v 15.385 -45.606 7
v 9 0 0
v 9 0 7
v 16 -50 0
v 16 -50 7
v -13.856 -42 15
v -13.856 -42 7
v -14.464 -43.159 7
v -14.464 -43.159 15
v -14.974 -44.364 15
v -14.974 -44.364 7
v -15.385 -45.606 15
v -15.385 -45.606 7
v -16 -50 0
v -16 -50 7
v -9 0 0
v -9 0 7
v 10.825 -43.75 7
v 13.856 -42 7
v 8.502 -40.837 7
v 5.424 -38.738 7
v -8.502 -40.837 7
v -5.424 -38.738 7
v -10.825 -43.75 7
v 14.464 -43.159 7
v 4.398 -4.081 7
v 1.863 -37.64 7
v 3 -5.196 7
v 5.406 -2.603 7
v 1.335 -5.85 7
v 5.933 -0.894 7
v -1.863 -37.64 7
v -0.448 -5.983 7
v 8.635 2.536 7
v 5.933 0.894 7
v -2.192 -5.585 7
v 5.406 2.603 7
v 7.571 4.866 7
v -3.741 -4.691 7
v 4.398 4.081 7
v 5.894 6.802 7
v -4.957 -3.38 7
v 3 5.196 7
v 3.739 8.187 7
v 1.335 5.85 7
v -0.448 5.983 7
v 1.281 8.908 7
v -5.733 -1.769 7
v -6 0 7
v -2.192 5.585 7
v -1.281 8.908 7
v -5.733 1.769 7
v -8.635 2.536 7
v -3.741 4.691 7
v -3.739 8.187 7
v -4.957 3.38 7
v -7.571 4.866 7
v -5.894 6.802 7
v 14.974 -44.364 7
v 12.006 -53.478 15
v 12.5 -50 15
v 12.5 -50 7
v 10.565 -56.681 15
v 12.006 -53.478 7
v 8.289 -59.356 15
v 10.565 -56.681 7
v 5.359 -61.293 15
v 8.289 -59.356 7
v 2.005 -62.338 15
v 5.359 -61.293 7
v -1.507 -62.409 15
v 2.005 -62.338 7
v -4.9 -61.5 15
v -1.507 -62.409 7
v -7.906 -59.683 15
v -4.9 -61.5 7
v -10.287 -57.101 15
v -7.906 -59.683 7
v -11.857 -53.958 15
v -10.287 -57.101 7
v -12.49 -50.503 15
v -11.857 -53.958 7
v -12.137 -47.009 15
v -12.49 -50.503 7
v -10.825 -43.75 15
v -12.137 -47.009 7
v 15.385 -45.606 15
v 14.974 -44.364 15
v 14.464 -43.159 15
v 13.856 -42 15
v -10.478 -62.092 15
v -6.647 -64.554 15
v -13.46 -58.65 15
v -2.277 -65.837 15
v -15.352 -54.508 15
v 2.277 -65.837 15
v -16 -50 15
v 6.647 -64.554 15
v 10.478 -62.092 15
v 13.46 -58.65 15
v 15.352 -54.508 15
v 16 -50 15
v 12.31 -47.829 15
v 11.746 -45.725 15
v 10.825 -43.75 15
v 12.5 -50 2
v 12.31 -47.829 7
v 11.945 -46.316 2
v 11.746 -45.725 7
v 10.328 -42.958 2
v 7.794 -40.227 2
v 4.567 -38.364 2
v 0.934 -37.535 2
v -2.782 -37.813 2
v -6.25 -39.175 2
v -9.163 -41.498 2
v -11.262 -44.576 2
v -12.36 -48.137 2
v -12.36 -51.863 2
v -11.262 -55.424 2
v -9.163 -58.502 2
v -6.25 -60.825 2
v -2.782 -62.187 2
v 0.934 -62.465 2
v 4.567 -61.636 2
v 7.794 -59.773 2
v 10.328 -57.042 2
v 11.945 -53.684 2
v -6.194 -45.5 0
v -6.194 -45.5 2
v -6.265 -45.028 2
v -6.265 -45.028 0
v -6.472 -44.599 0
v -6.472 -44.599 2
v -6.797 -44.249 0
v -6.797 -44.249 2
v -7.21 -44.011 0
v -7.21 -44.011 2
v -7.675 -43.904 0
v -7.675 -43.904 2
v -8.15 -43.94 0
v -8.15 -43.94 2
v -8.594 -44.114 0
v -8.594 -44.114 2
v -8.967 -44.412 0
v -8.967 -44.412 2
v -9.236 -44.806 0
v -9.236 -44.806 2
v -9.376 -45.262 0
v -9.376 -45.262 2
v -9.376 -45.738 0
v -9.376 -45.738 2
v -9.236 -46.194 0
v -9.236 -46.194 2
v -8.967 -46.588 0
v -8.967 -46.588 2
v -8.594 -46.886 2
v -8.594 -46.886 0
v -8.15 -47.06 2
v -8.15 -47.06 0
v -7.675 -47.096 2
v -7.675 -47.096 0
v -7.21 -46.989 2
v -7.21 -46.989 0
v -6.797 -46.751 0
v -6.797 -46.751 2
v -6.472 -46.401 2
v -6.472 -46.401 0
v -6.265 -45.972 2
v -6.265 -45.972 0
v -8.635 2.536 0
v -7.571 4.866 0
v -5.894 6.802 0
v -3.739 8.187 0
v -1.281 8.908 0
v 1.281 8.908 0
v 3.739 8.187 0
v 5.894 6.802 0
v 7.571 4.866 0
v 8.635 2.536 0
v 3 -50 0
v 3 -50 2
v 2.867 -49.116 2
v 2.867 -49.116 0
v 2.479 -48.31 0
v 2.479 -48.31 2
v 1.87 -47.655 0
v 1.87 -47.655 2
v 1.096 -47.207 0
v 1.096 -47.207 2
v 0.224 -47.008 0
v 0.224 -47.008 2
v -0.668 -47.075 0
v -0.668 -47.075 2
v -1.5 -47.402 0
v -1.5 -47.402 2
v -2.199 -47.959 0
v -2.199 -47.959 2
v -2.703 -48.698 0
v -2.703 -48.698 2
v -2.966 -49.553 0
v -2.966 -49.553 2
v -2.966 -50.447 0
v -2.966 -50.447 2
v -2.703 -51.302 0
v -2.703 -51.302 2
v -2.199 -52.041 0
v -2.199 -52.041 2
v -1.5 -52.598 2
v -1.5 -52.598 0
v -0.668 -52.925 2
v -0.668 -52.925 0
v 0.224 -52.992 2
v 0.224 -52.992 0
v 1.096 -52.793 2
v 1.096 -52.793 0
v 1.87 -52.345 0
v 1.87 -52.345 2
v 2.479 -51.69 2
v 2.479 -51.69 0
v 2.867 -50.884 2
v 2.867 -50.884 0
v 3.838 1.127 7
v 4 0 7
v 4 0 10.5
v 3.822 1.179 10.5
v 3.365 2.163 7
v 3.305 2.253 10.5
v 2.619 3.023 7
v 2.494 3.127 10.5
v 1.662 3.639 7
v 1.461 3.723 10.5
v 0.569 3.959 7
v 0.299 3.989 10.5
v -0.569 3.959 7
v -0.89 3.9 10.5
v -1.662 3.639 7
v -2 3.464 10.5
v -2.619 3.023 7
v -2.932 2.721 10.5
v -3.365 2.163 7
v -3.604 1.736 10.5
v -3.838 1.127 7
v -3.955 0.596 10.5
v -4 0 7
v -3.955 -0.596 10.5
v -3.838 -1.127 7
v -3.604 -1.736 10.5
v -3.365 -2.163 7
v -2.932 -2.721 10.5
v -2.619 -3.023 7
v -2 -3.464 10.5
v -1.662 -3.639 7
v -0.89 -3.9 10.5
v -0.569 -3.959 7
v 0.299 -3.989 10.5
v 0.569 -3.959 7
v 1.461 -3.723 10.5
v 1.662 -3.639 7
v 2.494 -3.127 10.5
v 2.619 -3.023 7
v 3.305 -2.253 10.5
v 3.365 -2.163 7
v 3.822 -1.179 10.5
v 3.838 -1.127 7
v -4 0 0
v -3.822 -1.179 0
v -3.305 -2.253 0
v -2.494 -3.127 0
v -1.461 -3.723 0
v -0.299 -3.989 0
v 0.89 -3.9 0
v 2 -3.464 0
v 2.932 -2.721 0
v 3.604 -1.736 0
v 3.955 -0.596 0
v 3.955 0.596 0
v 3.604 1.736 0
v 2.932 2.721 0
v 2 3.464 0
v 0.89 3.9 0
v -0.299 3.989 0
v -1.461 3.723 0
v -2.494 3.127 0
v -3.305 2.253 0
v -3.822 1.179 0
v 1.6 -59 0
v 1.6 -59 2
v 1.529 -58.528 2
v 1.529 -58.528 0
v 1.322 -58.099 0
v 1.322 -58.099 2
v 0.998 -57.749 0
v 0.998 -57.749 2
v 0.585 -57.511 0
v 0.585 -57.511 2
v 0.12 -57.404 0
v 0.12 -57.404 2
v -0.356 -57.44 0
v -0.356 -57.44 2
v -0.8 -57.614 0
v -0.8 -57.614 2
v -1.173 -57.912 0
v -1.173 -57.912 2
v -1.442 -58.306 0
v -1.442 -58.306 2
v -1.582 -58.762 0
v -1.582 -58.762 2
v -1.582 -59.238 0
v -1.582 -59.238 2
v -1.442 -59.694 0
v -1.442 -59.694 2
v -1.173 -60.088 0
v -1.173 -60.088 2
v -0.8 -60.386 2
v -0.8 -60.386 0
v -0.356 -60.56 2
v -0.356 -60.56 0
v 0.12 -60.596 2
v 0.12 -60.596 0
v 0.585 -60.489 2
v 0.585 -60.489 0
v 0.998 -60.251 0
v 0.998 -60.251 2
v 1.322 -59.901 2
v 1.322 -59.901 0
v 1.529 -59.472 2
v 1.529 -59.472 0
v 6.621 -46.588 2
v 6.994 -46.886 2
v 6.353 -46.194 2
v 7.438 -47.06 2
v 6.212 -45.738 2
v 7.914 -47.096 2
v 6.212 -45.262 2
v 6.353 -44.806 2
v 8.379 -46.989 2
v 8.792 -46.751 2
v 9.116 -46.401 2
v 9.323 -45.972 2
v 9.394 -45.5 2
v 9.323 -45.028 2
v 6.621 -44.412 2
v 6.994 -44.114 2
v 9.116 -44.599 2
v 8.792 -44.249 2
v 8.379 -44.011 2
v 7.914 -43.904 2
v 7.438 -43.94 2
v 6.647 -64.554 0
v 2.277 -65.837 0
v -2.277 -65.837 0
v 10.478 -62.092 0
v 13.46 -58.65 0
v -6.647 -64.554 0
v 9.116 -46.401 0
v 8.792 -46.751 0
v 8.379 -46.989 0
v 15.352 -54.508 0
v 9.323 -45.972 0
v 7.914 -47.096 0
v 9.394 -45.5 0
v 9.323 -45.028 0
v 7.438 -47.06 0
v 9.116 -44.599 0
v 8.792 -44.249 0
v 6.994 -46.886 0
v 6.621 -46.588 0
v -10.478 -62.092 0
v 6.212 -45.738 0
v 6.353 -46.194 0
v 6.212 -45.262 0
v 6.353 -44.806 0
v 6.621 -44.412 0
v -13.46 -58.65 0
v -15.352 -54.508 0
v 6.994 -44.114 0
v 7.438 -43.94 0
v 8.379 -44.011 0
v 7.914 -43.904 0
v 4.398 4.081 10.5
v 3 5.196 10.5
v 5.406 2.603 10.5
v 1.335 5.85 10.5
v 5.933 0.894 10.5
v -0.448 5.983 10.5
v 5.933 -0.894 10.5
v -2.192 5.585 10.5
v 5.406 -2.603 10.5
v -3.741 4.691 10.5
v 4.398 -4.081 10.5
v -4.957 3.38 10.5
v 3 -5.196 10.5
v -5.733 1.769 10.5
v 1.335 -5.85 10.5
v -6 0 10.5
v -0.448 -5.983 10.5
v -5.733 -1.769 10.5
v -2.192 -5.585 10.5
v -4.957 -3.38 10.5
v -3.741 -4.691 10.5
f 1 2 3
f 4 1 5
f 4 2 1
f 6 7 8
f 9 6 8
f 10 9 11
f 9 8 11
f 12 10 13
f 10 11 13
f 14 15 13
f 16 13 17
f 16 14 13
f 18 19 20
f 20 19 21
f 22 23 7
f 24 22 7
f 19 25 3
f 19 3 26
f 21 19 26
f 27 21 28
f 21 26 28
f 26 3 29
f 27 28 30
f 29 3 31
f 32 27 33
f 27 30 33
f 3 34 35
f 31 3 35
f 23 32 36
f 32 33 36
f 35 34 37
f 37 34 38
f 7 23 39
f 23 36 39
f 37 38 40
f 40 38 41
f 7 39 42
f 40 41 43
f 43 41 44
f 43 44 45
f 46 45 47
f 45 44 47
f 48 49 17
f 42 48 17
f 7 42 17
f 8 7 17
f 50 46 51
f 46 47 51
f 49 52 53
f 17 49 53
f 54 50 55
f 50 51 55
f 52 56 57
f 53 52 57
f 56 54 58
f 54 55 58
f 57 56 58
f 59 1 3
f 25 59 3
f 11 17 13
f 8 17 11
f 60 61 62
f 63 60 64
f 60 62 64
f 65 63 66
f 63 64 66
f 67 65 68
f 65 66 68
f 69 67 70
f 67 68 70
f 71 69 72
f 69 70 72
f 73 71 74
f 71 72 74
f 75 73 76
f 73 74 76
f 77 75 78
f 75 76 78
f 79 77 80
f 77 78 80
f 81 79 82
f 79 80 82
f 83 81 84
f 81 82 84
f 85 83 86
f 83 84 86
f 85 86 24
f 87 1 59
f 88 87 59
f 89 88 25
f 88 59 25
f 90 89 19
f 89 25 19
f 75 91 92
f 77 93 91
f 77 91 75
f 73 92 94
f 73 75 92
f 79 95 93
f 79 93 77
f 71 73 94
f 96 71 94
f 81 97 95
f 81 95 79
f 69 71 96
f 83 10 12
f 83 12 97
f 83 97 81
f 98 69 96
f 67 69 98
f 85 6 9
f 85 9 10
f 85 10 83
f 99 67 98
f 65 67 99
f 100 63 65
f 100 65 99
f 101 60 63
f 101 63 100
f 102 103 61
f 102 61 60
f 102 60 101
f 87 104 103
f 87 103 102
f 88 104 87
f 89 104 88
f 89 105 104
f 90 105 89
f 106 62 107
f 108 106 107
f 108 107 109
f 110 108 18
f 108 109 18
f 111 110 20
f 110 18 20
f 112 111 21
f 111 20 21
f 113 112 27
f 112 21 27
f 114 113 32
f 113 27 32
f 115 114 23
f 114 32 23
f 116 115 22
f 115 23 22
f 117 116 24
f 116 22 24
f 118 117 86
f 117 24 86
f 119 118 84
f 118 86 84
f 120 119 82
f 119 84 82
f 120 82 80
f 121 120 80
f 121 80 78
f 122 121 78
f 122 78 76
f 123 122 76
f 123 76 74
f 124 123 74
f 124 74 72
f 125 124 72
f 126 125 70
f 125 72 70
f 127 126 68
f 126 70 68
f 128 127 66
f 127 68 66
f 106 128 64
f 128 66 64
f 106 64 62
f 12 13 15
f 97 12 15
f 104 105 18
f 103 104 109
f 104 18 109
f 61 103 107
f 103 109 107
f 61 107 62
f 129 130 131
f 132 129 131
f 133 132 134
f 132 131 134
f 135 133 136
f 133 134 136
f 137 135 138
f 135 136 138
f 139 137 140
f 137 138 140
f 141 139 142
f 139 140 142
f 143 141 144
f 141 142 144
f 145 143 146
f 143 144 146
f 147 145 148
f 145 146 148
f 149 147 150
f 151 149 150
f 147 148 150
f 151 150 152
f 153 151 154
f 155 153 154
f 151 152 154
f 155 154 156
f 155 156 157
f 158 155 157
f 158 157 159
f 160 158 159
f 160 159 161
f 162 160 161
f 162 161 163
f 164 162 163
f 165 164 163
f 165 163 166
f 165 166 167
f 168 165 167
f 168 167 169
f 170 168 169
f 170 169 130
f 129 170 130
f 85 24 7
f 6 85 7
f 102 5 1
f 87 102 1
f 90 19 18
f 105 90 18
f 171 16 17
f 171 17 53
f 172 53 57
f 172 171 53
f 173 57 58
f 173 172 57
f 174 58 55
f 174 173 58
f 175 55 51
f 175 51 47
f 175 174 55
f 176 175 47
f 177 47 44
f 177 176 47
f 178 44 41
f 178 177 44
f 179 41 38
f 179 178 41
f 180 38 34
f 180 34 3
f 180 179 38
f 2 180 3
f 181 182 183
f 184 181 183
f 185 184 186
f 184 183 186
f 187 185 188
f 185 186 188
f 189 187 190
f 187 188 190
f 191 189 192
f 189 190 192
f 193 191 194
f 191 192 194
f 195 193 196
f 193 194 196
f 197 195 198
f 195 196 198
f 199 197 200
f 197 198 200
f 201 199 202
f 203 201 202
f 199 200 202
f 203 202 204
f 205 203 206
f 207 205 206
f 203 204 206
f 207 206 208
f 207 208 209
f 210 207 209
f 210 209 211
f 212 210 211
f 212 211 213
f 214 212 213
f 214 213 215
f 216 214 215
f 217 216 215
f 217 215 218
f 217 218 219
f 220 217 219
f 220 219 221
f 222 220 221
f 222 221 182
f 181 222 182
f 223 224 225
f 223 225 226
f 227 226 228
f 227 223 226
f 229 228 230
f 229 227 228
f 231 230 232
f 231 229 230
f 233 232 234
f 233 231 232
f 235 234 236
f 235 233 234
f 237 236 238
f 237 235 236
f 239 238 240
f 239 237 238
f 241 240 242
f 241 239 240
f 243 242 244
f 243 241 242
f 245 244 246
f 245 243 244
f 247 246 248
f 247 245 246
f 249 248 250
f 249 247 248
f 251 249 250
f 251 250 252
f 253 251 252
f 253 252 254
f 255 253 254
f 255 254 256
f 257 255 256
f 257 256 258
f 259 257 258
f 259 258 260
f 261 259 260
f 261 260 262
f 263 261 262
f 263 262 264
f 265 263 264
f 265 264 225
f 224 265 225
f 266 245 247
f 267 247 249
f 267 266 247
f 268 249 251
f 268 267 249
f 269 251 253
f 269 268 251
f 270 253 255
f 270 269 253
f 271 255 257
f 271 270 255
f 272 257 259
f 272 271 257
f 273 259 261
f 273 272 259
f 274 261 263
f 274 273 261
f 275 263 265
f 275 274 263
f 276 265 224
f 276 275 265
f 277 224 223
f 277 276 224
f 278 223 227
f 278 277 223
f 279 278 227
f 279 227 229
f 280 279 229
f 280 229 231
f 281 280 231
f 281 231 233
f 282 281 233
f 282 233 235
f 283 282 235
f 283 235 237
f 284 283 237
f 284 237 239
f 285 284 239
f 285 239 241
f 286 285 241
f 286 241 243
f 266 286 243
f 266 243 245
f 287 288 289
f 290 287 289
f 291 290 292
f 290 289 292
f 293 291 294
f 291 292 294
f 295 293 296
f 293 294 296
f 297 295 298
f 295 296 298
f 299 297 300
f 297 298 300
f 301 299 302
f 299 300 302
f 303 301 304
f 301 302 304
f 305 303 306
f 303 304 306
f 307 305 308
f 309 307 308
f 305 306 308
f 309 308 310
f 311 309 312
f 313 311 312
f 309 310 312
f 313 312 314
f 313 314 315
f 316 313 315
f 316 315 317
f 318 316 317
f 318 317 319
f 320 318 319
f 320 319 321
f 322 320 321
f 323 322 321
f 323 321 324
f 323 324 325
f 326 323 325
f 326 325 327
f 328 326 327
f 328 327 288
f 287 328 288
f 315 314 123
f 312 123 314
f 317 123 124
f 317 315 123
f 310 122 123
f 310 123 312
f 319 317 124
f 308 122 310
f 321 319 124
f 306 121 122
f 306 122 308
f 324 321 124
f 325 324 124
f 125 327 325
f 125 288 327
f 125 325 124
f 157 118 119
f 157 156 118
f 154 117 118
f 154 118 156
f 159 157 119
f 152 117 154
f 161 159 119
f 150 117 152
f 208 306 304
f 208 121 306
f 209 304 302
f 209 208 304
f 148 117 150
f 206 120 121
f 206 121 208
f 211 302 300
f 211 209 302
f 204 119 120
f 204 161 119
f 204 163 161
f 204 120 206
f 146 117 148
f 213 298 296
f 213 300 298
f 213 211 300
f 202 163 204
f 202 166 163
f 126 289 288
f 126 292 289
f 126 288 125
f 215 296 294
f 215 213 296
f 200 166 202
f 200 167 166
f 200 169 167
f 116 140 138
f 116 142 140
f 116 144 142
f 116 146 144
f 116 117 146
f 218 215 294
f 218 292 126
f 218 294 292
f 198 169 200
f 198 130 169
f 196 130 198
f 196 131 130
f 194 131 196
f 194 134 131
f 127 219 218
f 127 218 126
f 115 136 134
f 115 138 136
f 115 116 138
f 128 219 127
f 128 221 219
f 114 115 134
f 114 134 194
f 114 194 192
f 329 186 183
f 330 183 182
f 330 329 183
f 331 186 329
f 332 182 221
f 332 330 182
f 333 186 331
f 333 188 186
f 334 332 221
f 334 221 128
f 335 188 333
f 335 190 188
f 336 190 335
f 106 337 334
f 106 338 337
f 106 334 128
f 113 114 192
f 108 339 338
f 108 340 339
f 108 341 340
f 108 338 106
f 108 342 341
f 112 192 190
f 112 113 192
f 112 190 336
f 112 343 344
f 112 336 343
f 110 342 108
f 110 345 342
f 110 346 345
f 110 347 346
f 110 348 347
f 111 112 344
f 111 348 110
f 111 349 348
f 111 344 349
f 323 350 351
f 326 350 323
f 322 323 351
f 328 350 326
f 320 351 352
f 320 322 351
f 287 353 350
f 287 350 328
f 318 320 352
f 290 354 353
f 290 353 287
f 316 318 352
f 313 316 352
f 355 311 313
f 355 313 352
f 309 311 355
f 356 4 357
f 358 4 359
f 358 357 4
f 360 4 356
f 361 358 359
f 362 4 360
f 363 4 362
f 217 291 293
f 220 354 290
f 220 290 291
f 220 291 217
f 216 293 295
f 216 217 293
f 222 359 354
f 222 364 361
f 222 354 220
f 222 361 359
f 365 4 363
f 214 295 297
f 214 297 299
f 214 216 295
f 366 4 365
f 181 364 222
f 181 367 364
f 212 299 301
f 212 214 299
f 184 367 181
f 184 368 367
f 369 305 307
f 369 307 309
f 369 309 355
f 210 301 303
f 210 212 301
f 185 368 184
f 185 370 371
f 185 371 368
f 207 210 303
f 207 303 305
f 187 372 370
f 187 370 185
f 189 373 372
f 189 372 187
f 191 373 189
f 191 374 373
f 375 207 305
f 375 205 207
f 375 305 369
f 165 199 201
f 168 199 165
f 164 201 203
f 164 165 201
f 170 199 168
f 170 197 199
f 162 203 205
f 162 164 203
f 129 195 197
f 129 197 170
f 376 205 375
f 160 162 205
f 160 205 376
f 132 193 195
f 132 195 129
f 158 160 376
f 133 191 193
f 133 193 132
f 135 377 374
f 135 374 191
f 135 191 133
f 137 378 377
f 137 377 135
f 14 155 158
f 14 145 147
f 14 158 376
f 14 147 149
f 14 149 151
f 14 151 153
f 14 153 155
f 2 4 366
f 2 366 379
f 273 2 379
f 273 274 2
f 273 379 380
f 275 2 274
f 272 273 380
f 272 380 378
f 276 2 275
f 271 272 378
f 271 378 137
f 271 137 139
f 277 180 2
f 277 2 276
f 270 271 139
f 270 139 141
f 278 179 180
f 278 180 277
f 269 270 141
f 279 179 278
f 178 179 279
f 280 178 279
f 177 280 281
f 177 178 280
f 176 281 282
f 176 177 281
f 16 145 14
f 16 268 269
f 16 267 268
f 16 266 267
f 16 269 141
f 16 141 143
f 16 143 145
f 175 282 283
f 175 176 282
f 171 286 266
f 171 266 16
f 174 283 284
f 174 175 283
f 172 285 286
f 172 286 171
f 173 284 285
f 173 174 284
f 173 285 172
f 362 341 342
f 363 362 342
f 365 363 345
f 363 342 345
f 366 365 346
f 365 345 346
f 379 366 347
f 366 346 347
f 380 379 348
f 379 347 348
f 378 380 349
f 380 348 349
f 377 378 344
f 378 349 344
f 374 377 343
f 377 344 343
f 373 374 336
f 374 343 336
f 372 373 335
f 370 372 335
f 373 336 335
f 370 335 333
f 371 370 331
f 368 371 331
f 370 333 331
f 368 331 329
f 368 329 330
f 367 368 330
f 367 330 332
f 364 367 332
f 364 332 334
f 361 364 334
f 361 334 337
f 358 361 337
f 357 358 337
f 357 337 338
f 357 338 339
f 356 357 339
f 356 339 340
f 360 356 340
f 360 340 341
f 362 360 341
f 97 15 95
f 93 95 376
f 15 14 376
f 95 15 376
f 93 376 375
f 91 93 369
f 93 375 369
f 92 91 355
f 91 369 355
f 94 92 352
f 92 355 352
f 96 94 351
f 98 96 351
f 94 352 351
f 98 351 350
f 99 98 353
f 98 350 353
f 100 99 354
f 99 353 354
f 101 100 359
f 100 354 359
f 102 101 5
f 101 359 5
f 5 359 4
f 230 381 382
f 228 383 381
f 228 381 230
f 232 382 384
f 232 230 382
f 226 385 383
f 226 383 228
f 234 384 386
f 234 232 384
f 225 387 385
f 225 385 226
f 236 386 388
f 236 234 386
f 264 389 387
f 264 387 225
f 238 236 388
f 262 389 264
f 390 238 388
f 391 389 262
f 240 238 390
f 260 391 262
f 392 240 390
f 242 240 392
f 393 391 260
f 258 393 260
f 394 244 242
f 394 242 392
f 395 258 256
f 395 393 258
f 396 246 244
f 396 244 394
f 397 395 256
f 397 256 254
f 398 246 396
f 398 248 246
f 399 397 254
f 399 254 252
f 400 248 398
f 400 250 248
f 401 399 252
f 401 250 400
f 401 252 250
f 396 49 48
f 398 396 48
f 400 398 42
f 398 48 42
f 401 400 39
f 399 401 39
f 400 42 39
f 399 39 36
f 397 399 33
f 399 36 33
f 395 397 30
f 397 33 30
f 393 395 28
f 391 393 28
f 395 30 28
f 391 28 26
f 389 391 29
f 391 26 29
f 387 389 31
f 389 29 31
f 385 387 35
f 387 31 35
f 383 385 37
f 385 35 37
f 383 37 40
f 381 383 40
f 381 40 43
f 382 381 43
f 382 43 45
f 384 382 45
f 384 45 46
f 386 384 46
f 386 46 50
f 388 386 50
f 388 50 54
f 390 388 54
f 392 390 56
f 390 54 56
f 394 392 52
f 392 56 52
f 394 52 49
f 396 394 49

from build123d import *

# Parameters (mm, degrees)
BOSS_EXTRU_1_DEPTH      = 7
ESQUISSE2_R             = 3
ENL_V_MAT_EXTRU_1_DEPTH = 7
ESQUISSE3_R             = 1.6
ENL_V_MAT_EXTRU_2_DEPTH = 7
ESQUISSE5_R             = 12.5
ENL_V_MAT_EXTRU_5_DEPTH = 5
ESQUISSE17_R            = 6
ESQUISSE17_R_2          = 4
BOSS_EXTRU_6_DEPTH      = 3.5
BOSS_EXTRU_8_DEPTH      = 8
ENL_V_START             = -8
ESQUISSE19_R            = 4
ENL_V_MAT_EXTRU_6_DEPTH = 8


with BuildPart() as part:
    # Esquisse1 → Boss.-Extru.1 (new body)
    with BuildSketch(Plane.XY):
        with BuildLine():
            Line((9, 0), (16, -50))
            ThreePointArc((16, -50), (0, -66), (-16, -50))
            Line((-16, -50), (-9, 0))
            ThreePointArc((-9, 0), (0, 9), (9, 0))
        make_face()
    extrude(amount=BOSS_EXTRU_1_DEPTH)

    # Esquisse2 → Enlèv. mat.-Extru.1 (cut)
    with BuildSketch(Plane.XY.offset(7)):
        with Locations((0, -50)):
            Circle(ESQUISSE2_R)
    extrude(amount=-ENL_V_MAT_EXTRU_1_DEPTH, mode=Mode.SUBTRACT)

    # Esquisse3 → Enlèv. mat.-Extru.2 (cut)
    with BuildSketch(Plane.XY.offset(7)):
        with Locations((0, -59)):
            Circle(ESQUISSE3_R)
        with Locations((-7.794228634, -45.5)):
            Circle(ESQUISSE3_R)
        with Locations((7.794228634, -45.5)):
            Circle(ESQUISSE3_R)
    extrude(amount=-ENL_V_MAT_EXTRU_2_DEPTH, mode=Mode.SUBTRACT)

    # Esquisse5 → Enlèv. mat.-Extru.5 (cut)
    with BuildSketch(Plane.XY.offset(7)):
        with Locations((0, -50)):
            Circle(ESQUISSE5_R)
    extrude(amount=-ENL_V_MAT_EXTRU_5_DEPTH, mode=Mode.SUBTRACT)

    # Esquisse17 → Boss.-Extru.6 (add)
    with BuildSketch(Plane.XY.offset(7)):
        with Locations(Location((0, 0, 0), (0, 0, 180))):
            Circle(ESQUISSE17_R)
        Circle(ESQUISSE17_R_2, mode=Mode.SUBTRACT)
    extrude(amount=BOSS_EXTRU_6_DEPTH)

    # Esquisse18 → Boss.-Extru.8 (add)
    with BuildSketch(Plane.XY.offset(7)):
        with BuildLine():
            Line((-10.825317547, -43.75), (-13.856406461, -42))
            ThreePointArc((-13.856406461, -42), (-14.731391476, -43.756114576), (-15.384856807, -45.606120047))
            Line((-15.384856807, -45.606120047), (-16, -50))
            ThreePointArc((-16, -50), (0, -66), (16, -50))
            Line((16, -50), (15.384856807, -45.606120047))
            ThreePointArc((15.384856807, -45.606120047), (14.731391476, -43.756114576), (13.856406461, -42))
            Line((13.856406461, -42), (10.825317547, -43.75))
            ThreePointArc((10.825317547, -43.75), (12.074072829, -46.764761936), (12.5, -50))
            ThreePointArc((12.5, -50), (-3.235238064, -62.074072829), (-10.825317547, -43.75))
        make_face()
    extrude(amount=BOSS_EXTRU_8_DEPTH)

    # Esquisse19 → Enlèv. mat.-Extru.6 (cut)
    with BuildSketch(Plane.XY.offset(7).offset(ENL_V_START)):
        with Locations(Location((0, 0, 0), (0, 0, 180))):
            Circle(ESQUISSE19_R)
    extrude(amount=ENL_V_MAT_EXTRU_6_DEPTH, mode=Mode.SUBTRACT)


solid = part.part
